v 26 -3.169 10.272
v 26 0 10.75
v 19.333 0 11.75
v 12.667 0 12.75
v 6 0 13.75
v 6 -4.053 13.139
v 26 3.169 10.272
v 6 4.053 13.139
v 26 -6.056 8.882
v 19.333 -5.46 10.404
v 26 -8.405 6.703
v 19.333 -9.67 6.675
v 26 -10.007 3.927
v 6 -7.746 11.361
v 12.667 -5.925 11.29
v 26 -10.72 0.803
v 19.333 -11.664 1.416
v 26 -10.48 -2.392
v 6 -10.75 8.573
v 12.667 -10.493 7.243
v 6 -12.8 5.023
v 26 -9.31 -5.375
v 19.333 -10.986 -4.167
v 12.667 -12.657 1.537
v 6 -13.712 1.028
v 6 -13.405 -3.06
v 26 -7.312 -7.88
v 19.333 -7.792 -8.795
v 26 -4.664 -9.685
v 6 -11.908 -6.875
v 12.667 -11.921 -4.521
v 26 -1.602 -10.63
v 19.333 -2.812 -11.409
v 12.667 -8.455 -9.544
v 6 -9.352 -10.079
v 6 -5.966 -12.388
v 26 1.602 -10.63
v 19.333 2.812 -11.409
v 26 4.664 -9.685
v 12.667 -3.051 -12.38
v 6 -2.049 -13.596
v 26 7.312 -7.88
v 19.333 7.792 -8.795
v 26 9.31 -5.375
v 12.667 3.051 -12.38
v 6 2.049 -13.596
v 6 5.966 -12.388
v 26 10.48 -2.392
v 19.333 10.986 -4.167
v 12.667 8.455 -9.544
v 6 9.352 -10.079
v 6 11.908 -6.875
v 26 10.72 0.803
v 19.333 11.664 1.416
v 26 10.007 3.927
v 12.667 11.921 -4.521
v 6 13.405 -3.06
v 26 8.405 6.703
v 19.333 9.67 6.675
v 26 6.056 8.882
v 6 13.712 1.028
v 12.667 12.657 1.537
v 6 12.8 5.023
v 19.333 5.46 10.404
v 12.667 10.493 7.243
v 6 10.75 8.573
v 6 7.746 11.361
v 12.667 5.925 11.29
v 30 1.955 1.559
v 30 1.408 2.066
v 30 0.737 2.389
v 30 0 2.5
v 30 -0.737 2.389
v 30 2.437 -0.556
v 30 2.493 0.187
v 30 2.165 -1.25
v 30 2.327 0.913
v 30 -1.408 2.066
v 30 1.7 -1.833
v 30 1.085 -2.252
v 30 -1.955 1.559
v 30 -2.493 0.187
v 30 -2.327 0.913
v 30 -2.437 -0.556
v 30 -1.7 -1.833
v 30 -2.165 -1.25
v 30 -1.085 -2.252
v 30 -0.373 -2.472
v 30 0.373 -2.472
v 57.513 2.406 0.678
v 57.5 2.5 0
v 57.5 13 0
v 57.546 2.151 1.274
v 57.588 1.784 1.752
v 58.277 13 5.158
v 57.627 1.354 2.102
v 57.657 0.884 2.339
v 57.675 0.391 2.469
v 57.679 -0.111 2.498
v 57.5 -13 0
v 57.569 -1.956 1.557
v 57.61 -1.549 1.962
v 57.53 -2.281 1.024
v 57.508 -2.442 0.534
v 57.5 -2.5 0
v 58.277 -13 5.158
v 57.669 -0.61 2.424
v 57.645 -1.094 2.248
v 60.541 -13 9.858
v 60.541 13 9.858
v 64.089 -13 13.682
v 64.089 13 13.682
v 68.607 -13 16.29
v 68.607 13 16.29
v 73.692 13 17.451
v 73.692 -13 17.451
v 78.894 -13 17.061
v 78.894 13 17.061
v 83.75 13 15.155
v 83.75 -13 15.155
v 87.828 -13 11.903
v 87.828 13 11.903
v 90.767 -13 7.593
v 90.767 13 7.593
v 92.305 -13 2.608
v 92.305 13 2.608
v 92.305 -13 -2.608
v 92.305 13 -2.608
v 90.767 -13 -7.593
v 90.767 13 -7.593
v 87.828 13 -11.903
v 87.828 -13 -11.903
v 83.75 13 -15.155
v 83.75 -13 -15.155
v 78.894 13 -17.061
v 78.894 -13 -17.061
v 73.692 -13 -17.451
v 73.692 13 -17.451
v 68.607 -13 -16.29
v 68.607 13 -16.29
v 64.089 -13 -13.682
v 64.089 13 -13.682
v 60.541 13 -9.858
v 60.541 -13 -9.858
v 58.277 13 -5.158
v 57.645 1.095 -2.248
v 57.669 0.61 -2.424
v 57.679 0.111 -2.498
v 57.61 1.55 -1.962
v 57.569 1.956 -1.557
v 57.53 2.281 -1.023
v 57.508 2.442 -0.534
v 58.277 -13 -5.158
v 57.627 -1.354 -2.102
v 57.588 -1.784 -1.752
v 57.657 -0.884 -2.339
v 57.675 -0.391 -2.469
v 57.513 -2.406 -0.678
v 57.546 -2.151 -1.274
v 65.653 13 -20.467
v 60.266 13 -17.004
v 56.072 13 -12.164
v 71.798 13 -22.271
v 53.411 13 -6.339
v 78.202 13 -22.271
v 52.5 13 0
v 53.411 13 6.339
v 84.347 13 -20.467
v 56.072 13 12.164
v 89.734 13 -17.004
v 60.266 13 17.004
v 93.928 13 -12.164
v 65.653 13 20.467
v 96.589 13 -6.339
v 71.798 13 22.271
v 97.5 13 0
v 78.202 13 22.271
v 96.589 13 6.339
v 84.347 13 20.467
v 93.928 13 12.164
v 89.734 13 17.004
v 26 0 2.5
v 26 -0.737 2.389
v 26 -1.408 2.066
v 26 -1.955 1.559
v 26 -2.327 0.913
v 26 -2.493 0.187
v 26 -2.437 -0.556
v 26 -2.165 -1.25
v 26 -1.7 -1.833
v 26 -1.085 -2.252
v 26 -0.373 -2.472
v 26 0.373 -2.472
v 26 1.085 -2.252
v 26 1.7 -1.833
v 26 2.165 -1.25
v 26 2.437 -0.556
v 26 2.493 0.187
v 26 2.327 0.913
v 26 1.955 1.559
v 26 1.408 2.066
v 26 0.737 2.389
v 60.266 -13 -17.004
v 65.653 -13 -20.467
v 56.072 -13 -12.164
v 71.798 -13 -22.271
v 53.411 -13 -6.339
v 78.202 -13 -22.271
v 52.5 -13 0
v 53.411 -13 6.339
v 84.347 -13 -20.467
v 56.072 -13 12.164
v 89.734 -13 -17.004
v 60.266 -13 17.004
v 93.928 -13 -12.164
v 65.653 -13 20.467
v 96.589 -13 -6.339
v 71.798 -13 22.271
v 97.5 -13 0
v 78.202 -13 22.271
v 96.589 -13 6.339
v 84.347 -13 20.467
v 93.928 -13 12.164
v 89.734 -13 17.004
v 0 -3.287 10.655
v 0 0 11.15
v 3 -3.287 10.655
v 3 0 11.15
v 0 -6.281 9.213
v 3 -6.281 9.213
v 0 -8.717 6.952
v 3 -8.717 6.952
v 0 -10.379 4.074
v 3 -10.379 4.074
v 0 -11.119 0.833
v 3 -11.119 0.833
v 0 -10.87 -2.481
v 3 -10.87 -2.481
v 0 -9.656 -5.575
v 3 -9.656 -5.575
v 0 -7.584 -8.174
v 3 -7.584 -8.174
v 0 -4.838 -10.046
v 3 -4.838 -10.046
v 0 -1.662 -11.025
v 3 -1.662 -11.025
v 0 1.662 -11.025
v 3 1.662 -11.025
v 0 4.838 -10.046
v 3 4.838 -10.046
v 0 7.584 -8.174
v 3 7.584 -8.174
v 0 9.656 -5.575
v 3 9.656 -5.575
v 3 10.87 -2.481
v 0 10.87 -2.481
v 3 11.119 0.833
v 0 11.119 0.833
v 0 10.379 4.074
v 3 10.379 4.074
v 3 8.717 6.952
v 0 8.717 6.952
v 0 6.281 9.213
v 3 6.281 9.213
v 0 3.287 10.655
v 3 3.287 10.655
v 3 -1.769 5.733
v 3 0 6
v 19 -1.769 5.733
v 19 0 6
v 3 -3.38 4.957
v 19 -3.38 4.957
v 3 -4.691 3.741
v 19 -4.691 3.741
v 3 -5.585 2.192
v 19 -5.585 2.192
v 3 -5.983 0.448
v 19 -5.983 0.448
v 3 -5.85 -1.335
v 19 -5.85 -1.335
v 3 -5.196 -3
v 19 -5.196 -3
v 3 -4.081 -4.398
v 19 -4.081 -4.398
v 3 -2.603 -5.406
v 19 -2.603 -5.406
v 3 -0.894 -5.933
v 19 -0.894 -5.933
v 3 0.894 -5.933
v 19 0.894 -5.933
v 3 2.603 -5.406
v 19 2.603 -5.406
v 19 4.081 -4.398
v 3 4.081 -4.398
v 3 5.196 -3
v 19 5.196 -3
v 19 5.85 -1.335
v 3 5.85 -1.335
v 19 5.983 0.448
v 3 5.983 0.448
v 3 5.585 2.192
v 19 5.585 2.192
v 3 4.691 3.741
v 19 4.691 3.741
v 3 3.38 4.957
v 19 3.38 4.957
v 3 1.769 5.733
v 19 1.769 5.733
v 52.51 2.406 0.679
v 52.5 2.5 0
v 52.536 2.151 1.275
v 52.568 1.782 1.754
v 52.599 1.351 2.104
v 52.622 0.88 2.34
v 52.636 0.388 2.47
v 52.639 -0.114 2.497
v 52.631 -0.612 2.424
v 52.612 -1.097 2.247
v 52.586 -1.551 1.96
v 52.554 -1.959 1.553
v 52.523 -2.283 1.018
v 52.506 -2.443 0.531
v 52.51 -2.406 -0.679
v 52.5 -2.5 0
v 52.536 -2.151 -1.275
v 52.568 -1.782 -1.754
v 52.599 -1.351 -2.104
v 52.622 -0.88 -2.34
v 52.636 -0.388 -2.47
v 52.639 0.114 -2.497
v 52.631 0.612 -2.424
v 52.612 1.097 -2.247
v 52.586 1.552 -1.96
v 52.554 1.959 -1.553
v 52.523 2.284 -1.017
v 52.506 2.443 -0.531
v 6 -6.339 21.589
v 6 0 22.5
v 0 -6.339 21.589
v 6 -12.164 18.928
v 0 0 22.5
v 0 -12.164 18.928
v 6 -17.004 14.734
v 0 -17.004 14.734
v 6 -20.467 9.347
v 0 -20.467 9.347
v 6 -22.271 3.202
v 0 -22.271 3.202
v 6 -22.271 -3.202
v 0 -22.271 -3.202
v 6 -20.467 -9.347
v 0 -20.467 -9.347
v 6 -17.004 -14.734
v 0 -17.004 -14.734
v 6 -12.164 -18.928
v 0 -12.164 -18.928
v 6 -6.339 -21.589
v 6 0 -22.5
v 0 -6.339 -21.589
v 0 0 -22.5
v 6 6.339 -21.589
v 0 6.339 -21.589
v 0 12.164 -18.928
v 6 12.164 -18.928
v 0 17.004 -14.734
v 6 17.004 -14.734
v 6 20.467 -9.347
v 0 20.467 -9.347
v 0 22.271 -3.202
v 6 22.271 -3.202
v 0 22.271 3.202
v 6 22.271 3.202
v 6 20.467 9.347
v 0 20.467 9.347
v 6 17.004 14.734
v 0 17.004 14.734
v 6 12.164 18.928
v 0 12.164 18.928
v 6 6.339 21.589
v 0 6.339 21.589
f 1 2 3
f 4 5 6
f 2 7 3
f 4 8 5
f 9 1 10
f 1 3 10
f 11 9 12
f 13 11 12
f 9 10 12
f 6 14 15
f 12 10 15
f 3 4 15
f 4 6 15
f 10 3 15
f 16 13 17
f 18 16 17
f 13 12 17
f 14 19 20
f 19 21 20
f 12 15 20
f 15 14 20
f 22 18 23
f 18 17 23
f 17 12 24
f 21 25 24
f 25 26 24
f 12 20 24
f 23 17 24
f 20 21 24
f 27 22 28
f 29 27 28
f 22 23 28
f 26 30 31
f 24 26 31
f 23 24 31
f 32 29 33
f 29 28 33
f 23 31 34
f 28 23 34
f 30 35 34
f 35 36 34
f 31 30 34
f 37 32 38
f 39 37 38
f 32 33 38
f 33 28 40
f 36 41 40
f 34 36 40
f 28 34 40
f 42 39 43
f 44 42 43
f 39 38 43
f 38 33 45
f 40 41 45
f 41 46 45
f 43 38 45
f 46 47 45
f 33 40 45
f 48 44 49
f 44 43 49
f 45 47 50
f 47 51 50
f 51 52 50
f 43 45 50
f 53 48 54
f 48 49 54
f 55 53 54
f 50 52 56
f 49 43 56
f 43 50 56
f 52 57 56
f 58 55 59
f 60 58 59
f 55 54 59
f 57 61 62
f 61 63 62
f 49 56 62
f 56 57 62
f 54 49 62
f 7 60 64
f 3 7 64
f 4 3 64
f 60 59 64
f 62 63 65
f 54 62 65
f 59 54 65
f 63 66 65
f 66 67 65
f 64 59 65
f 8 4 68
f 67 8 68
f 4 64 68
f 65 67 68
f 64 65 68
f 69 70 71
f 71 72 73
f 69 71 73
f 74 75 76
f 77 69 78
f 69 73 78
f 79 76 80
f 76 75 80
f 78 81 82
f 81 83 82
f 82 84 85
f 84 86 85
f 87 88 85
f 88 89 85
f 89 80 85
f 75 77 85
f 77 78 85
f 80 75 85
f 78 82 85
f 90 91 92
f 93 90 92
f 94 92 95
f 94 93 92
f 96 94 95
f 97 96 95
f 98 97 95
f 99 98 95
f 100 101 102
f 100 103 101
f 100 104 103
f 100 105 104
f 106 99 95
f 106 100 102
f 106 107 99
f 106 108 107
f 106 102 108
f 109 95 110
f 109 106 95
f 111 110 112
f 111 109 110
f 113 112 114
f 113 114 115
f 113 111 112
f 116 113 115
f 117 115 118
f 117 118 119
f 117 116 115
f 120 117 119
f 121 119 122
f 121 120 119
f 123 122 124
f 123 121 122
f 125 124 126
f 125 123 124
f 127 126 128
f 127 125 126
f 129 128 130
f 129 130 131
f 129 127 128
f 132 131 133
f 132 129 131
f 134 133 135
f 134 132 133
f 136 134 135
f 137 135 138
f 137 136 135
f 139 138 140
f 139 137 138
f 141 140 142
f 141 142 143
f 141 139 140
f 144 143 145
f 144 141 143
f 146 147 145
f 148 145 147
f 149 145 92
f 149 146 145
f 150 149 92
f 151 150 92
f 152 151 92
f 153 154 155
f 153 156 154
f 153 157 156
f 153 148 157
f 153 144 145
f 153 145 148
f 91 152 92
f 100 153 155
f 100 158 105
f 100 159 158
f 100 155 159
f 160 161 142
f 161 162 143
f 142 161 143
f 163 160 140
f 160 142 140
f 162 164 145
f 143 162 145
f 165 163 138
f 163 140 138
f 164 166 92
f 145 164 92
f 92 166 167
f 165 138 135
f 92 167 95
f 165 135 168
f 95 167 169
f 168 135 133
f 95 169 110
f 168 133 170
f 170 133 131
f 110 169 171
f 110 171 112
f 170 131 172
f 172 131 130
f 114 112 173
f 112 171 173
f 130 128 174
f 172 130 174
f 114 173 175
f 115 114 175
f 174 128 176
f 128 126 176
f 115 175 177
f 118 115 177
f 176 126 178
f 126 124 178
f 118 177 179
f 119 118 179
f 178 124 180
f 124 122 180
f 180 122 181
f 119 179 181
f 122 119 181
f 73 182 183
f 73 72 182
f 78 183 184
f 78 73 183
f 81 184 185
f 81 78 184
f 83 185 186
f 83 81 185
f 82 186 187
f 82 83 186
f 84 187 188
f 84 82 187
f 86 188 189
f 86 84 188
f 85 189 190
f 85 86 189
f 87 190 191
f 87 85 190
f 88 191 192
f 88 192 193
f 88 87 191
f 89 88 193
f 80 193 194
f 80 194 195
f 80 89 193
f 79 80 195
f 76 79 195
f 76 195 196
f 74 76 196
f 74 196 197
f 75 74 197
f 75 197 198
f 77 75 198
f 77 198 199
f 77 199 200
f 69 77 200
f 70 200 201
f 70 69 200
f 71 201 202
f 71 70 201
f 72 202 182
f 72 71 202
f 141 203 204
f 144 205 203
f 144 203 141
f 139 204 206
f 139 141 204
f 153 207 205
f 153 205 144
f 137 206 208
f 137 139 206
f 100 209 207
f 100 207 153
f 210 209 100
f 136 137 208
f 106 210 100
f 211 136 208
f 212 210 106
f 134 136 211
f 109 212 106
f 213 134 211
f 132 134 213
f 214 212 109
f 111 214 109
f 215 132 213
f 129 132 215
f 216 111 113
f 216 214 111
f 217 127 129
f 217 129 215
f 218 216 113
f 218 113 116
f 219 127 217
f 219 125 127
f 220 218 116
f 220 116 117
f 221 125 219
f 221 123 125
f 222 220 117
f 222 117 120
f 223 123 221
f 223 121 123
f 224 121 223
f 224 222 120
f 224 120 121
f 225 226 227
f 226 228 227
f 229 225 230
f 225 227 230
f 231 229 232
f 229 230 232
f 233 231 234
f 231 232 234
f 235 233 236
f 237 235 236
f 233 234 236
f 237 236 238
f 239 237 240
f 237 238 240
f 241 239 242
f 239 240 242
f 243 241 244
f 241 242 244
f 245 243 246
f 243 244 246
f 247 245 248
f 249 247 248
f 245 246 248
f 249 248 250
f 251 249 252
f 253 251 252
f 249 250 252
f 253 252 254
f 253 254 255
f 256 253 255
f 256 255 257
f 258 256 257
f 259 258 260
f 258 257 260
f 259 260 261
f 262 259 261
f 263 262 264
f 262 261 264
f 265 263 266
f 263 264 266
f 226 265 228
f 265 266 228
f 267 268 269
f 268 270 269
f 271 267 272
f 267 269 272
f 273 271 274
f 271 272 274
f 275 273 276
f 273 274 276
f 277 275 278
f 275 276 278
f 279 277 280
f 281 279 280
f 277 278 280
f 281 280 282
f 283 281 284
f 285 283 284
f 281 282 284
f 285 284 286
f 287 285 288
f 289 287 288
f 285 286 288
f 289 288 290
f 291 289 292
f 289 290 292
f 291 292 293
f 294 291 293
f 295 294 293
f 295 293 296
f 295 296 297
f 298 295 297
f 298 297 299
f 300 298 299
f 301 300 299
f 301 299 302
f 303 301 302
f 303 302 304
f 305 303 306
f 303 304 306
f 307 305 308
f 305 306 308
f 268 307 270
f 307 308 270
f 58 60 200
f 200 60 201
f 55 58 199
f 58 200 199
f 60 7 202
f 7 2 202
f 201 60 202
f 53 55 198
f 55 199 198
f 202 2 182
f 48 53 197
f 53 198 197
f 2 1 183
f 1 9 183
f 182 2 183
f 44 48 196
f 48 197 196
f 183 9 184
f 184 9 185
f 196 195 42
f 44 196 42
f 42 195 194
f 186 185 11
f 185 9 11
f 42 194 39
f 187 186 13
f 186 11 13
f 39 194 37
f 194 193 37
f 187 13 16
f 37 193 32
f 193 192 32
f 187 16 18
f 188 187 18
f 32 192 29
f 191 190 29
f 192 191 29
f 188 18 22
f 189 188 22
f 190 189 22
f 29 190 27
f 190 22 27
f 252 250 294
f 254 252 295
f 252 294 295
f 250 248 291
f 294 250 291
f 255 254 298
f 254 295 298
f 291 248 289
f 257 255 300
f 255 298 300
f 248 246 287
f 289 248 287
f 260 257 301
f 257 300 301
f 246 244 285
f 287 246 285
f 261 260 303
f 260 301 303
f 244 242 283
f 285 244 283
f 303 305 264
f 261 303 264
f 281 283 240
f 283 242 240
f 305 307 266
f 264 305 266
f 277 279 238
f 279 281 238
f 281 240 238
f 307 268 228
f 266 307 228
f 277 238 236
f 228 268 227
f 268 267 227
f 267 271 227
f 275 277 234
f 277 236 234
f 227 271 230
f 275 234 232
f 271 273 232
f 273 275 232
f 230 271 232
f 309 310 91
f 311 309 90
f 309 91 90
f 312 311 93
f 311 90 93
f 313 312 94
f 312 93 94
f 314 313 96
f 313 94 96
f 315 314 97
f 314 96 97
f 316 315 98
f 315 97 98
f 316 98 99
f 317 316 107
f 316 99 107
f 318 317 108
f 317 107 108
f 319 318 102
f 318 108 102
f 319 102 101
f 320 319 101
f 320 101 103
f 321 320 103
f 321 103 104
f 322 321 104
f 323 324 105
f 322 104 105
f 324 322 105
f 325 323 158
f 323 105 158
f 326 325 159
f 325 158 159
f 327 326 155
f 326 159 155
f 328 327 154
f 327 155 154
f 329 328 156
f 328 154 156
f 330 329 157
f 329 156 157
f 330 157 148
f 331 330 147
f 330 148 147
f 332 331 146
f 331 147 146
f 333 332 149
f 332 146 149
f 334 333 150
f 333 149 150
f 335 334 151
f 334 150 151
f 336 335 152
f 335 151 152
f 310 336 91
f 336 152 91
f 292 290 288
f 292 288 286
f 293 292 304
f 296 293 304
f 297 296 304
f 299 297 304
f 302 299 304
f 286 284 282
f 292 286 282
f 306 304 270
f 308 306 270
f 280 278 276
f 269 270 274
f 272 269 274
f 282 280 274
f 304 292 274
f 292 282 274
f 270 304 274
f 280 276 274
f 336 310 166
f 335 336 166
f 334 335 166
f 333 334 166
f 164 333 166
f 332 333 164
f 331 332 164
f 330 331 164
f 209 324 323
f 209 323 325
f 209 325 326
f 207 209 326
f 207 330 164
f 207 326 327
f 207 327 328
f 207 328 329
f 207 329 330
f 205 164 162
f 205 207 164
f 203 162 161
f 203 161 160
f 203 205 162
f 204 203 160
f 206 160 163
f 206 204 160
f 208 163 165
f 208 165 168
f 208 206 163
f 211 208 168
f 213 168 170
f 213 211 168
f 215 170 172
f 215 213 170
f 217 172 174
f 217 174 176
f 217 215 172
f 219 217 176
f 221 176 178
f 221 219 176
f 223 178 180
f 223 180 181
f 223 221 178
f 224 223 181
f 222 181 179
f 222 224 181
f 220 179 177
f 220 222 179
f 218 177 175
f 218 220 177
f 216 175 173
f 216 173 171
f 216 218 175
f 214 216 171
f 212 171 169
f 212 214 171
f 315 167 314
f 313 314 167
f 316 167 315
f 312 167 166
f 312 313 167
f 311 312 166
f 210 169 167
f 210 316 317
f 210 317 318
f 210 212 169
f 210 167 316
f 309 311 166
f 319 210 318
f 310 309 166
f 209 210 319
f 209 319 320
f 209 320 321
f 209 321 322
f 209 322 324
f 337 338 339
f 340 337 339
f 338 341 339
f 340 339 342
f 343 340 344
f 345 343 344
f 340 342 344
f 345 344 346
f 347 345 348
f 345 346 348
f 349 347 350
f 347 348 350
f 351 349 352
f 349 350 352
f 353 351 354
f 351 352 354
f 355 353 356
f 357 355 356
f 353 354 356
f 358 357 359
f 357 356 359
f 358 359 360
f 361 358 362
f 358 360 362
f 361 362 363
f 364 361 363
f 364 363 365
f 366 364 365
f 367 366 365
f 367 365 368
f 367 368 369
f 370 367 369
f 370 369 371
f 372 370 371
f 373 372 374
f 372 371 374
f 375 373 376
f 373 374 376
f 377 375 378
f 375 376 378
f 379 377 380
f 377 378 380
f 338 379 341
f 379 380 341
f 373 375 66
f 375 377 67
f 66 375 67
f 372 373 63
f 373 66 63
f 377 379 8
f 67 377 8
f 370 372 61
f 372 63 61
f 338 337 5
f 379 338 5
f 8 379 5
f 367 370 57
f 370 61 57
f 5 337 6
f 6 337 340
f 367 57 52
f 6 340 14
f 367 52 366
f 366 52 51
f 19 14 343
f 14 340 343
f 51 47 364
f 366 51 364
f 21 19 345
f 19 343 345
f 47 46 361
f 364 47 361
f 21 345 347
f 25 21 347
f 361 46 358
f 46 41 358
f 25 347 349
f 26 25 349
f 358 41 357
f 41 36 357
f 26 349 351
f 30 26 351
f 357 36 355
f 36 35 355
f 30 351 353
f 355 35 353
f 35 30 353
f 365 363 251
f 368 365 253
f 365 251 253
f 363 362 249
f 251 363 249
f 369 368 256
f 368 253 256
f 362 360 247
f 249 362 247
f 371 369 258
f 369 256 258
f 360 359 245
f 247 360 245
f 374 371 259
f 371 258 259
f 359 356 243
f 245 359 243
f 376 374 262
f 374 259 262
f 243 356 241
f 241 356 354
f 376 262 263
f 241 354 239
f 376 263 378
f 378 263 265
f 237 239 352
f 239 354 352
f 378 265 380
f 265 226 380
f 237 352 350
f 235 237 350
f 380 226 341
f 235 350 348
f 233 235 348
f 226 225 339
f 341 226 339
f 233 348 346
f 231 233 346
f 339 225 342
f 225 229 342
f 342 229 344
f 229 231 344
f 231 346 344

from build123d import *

# Parameters (mm, degrees)
F0_W     = 4
F0_H     = 2.5
F3_DEPTH = 13
F5_R     = 2.5
F6_DEPTH = 5


with BuildPart() as f1:
    # F0 (on Front) → F1 (revolve)
    with BuildSketch(Plane.XZ):
        Polygon((0, 22.5), (0, 11.15), (3, 11.15), (3, 6), (6, 6), (6, 13.75), (6, 22.5), align=None)
        Polygon((6, 13.75), (6, 6), (19, 6), (19, 0), (26, 0), (26, 2.5), (26, 10.75), align=None)
        with Locations((28, 1.25)):
            Rectangle(F0_W, F0_H)
    revolve(axis=Axis((16, 0, 0), (1, 0, 0)))


with BuildPart() as f3:
    # F2 (on Front) → F3 (new body, symmetric)
    with BuildSketch(Plane.XZ):
        with BuildLine():
            ThreePointArc((97.5, 0), (75, 22.5), (52.5, 0))
            ThreePointArc((52.5, 0), (75, -22.5), (97.5, 0))
        make_face()
        with BuildLine():
            ThreePointArc((92.5, 0), (75, -17.5), (57.5, 0))
            ThreePointArc((57.5, 0), (75, 17.5), (92.5, 0))
        make_face(mode=Mode.SUBTRACT)
    extrude(amount=F3_DEPTH, both=True)

    # F5 (on offset) → F6 (cut, symmetric)
    with BuildSketch(Plane.YZ.offset(56)):
        Circle(F5_R)
    extrude(amount=F6_DEPTH, both=True, mode=Mode.SUBTRACT)


solid = Compound([f1.part, f3.part])
